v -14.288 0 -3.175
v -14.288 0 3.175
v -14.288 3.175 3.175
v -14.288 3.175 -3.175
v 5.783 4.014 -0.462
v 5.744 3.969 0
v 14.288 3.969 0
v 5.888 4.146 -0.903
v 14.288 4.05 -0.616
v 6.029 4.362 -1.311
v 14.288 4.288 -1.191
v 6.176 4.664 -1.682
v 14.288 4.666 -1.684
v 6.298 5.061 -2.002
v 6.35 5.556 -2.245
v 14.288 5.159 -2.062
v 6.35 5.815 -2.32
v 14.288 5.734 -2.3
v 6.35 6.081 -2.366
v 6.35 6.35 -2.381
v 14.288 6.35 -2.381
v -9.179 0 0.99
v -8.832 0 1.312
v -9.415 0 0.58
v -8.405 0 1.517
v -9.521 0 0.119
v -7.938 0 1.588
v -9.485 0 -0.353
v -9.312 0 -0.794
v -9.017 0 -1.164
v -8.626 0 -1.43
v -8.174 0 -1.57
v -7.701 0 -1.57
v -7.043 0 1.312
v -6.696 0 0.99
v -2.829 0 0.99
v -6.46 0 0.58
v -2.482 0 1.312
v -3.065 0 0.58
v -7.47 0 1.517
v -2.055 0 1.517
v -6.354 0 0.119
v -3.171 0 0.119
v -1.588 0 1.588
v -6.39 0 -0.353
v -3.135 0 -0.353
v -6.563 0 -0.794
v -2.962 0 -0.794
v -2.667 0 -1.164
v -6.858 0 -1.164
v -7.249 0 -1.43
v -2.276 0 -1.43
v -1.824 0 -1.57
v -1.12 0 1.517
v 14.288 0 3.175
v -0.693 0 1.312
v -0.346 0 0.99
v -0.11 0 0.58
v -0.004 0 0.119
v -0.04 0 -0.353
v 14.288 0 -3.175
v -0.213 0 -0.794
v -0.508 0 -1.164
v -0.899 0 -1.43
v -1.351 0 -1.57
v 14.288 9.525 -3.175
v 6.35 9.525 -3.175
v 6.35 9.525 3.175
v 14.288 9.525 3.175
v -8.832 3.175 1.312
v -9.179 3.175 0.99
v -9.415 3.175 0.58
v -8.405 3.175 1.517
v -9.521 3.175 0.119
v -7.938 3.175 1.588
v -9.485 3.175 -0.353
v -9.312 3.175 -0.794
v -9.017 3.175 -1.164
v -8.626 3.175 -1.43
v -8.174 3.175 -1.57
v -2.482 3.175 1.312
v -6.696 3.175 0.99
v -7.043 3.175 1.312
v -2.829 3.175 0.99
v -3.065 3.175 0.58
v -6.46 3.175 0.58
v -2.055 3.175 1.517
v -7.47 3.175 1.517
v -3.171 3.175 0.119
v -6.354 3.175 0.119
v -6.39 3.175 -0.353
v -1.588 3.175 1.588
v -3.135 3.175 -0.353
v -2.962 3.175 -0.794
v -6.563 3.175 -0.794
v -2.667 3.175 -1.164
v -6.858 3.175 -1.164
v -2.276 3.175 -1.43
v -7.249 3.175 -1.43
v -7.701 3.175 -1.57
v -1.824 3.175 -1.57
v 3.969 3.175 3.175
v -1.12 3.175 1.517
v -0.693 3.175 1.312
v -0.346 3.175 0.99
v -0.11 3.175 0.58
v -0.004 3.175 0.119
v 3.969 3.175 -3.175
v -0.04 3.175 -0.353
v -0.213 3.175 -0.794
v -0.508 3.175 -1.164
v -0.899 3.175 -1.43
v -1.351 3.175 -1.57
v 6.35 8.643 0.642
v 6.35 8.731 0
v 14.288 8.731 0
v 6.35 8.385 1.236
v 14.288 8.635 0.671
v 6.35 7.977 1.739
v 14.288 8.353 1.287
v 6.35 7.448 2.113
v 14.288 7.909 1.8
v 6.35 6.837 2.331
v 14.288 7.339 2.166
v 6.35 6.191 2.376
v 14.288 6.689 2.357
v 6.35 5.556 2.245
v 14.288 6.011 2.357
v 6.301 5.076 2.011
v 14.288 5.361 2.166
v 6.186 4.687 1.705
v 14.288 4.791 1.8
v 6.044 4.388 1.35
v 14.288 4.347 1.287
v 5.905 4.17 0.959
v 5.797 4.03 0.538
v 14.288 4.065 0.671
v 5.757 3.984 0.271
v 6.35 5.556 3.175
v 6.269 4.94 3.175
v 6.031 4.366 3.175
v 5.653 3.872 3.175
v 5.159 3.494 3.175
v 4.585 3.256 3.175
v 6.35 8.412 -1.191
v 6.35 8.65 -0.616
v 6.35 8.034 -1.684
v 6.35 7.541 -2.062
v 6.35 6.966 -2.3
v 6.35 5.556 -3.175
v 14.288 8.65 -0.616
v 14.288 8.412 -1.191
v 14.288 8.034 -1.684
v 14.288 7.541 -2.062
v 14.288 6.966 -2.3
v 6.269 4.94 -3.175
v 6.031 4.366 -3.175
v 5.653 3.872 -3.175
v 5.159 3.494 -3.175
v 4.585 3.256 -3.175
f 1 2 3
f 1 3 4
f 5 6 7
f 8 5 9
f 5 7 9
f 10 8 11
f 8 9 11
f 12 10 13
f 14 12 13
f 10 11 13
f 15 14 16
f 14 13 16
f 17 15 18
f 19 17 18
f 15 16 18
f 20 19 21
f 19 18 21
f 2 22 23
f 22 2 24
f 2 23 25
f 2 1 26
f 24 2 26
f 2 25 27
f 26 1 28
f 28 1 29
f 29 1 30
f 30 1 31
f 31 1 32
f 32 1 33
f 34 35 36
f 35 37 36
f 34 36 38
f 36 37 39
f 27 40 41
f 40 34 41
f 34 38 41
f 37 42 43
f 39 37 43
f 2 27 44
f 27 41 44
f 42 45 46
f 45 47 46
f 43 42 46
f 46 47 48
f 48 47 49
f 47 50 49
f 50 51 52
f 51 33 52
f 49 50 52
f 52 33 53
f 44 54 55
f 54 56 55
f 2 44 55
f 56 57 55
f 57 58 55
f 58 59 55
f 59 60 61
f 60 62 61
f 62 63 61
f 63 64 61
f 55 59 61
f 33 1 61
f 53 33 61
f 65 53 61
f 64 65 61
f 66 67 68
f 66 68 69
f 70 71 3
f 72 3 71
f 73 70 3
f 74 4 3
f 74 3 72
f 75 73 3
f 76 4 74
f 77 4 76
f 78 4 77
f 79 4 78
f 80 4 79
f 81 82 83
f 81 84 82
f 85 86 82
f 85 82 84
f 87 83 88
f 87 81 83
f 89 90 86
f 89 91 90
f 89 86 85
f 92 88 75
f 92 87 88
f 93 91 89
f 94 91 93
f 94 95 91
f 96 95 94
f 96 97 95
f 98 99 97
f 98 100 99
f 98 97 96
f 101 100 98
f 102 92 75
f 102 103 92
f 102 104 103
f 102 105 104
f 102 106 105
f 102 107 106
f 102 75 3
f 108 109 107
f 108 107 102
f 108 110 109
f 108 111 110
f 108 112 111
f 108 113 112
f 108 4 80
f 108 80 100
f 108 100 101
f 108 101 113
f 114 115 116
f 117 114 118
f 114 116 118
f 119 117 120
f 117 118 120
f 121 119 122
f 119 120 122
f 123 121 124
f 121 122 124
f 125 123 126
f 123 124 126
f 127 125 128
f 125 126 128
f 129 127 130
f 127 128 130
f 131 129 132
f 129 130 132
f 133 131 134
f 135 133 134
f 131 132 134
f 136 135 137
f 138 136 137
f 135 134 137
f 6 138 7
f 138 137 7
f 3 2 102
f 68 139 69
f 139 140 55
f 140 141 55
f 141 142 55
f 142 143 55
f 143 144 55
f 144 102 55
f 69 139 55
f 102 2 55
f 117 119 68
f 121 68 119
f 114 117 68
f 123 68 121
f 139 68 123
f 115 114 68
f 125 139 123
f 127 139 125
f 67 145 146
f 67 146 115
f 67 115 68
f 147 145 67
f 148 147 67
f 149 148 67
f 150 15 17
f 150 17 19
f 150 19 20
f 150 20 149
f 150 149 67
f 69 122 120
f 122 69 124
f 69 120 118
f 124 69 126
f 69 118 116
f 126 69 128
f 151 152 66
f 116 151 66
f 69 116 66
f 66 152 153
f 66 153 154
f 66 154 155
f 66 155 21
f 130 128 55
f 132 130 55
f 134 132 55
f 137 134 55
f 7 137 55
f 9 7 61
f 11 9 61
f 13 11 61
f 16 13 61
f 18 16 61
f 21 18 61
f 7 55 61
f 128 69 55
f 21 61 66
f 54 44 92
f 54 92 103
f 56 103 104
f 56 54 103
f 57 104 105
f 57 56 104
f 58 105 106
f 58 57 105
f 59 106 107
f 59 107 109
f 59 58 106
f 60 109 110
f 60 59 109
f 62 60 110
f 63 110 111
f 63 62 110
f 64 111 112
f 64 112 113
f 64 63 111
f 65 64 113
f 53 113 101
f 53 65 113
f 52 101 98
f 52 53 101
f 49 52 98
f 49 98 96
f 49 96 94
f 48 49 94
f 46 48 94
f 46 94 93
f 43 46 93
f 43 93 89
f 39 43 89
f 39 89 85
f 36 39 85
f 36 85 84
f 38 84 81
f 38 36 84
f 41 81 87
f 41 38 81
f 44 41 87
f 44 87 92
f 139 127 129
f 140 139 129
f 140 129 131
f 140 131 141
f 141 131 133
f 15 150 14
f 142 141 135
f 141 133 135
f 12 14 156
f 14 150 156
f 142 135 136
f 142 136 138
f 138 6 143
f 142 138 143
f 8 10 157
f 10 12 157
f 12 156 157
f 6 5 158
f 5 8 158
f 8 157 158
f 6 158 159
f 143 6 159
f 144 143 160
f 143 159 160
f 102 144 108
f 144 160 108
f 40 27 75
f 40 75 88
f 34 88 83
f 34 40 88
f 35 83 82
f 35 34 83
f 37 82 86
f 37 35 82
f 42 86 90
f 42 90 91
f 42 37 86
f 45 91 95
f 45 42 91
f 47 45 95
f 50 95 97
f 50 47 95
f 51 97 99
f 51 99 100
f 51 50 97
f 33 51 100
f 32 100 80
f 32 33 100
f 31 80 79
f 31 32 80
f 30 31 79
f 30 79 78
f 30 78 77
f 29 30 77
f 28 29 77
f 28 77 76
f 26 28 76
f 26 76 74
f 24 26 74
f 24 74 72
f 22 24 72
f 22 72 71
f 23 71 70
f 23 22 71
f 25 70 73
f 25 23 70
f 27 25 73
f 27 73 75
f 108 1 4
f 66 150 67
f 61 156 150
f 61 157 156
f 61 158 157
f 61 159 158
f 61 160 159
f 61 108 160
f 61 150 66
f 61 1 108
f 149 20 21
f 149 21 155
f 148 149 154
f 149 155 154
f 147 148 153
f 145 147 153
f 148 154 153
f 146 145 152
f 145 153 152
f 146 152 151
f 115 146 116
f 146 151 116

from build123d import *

# Parameters (mm, degrees)
SKETCH1_W           = 20.6375
SKETCH1_H           = 6.35
SKETCH1_R           = 1.5875
BOSS_EXTRUDE1_DEPTH = 3.175
SKETCH1_3_W         = 7.9375
SKETCH1_3_H         = 6.35
BOSS_EXTRUDE2_DEPTH = 9.525
FILLET1_R           = 2.38125
SKETCH2_R           = 2.38125
CUT_EXTRUDE1_DEPTH  = 31.287569645


with BuildPart() as part:
    # Sketch1 → Boss-Extrude1 (new body)
    with BuildSketch(Plane(origin=(0, 0, 0), x_dir=(1, 0, 0), z_dir=(0, 1, 0))):
        with Locations((-3.96875, 0)):
            Rectangle(SKETCH1_W, SKETCH1_H)
        with Locations((-7.9375, 0)):
            Circle(SKETCH1_R, mode=Mode.SUBTRACT)
        with Locations((-1.5875, 0)):
            Circle(SKETCH1_R, mode=Mode.SUBTRACT)
    extrude(amount=BOSS_EXTRUDE1_DEPTH)

    # Sketch1<3> → Boss-Extrude2 (add)
    with BuildSketch(Plane(origin=(0, 0, 0), x_dir=(1, 0, 0), z_dir=(0, 1, 0))):
        with Locations((10.31875, 0)):
            Rectangle(SKETCH1_3_W, SKETCH1_3_H)
    extrude(amount=BOSS_EXTRUDE2_DEPTH)

    # Fillet1
    fillet1_edges = [part.edges().sort_by_distance(p)[0] for p in [
        (6.35, 3.175, 0),
    ]]
    fillet(fillet1_edges, radius=FILLET1_R)

    # Sketch2 → Cut-Extrude1 (cut, through all)
    with BuildSketch(Plane(origin=(14.2875, 0, 0), x_dir=(0, 0, -1), z_dir=(1, 0, 0))):
        with Locations((0, 6.35)):
            Circle(SKETCH2_R)
    extrude(amount=-CUT_EXTRUDE1_DEPTH, mode=Mode.SUBTRACT)


solid = part.part
